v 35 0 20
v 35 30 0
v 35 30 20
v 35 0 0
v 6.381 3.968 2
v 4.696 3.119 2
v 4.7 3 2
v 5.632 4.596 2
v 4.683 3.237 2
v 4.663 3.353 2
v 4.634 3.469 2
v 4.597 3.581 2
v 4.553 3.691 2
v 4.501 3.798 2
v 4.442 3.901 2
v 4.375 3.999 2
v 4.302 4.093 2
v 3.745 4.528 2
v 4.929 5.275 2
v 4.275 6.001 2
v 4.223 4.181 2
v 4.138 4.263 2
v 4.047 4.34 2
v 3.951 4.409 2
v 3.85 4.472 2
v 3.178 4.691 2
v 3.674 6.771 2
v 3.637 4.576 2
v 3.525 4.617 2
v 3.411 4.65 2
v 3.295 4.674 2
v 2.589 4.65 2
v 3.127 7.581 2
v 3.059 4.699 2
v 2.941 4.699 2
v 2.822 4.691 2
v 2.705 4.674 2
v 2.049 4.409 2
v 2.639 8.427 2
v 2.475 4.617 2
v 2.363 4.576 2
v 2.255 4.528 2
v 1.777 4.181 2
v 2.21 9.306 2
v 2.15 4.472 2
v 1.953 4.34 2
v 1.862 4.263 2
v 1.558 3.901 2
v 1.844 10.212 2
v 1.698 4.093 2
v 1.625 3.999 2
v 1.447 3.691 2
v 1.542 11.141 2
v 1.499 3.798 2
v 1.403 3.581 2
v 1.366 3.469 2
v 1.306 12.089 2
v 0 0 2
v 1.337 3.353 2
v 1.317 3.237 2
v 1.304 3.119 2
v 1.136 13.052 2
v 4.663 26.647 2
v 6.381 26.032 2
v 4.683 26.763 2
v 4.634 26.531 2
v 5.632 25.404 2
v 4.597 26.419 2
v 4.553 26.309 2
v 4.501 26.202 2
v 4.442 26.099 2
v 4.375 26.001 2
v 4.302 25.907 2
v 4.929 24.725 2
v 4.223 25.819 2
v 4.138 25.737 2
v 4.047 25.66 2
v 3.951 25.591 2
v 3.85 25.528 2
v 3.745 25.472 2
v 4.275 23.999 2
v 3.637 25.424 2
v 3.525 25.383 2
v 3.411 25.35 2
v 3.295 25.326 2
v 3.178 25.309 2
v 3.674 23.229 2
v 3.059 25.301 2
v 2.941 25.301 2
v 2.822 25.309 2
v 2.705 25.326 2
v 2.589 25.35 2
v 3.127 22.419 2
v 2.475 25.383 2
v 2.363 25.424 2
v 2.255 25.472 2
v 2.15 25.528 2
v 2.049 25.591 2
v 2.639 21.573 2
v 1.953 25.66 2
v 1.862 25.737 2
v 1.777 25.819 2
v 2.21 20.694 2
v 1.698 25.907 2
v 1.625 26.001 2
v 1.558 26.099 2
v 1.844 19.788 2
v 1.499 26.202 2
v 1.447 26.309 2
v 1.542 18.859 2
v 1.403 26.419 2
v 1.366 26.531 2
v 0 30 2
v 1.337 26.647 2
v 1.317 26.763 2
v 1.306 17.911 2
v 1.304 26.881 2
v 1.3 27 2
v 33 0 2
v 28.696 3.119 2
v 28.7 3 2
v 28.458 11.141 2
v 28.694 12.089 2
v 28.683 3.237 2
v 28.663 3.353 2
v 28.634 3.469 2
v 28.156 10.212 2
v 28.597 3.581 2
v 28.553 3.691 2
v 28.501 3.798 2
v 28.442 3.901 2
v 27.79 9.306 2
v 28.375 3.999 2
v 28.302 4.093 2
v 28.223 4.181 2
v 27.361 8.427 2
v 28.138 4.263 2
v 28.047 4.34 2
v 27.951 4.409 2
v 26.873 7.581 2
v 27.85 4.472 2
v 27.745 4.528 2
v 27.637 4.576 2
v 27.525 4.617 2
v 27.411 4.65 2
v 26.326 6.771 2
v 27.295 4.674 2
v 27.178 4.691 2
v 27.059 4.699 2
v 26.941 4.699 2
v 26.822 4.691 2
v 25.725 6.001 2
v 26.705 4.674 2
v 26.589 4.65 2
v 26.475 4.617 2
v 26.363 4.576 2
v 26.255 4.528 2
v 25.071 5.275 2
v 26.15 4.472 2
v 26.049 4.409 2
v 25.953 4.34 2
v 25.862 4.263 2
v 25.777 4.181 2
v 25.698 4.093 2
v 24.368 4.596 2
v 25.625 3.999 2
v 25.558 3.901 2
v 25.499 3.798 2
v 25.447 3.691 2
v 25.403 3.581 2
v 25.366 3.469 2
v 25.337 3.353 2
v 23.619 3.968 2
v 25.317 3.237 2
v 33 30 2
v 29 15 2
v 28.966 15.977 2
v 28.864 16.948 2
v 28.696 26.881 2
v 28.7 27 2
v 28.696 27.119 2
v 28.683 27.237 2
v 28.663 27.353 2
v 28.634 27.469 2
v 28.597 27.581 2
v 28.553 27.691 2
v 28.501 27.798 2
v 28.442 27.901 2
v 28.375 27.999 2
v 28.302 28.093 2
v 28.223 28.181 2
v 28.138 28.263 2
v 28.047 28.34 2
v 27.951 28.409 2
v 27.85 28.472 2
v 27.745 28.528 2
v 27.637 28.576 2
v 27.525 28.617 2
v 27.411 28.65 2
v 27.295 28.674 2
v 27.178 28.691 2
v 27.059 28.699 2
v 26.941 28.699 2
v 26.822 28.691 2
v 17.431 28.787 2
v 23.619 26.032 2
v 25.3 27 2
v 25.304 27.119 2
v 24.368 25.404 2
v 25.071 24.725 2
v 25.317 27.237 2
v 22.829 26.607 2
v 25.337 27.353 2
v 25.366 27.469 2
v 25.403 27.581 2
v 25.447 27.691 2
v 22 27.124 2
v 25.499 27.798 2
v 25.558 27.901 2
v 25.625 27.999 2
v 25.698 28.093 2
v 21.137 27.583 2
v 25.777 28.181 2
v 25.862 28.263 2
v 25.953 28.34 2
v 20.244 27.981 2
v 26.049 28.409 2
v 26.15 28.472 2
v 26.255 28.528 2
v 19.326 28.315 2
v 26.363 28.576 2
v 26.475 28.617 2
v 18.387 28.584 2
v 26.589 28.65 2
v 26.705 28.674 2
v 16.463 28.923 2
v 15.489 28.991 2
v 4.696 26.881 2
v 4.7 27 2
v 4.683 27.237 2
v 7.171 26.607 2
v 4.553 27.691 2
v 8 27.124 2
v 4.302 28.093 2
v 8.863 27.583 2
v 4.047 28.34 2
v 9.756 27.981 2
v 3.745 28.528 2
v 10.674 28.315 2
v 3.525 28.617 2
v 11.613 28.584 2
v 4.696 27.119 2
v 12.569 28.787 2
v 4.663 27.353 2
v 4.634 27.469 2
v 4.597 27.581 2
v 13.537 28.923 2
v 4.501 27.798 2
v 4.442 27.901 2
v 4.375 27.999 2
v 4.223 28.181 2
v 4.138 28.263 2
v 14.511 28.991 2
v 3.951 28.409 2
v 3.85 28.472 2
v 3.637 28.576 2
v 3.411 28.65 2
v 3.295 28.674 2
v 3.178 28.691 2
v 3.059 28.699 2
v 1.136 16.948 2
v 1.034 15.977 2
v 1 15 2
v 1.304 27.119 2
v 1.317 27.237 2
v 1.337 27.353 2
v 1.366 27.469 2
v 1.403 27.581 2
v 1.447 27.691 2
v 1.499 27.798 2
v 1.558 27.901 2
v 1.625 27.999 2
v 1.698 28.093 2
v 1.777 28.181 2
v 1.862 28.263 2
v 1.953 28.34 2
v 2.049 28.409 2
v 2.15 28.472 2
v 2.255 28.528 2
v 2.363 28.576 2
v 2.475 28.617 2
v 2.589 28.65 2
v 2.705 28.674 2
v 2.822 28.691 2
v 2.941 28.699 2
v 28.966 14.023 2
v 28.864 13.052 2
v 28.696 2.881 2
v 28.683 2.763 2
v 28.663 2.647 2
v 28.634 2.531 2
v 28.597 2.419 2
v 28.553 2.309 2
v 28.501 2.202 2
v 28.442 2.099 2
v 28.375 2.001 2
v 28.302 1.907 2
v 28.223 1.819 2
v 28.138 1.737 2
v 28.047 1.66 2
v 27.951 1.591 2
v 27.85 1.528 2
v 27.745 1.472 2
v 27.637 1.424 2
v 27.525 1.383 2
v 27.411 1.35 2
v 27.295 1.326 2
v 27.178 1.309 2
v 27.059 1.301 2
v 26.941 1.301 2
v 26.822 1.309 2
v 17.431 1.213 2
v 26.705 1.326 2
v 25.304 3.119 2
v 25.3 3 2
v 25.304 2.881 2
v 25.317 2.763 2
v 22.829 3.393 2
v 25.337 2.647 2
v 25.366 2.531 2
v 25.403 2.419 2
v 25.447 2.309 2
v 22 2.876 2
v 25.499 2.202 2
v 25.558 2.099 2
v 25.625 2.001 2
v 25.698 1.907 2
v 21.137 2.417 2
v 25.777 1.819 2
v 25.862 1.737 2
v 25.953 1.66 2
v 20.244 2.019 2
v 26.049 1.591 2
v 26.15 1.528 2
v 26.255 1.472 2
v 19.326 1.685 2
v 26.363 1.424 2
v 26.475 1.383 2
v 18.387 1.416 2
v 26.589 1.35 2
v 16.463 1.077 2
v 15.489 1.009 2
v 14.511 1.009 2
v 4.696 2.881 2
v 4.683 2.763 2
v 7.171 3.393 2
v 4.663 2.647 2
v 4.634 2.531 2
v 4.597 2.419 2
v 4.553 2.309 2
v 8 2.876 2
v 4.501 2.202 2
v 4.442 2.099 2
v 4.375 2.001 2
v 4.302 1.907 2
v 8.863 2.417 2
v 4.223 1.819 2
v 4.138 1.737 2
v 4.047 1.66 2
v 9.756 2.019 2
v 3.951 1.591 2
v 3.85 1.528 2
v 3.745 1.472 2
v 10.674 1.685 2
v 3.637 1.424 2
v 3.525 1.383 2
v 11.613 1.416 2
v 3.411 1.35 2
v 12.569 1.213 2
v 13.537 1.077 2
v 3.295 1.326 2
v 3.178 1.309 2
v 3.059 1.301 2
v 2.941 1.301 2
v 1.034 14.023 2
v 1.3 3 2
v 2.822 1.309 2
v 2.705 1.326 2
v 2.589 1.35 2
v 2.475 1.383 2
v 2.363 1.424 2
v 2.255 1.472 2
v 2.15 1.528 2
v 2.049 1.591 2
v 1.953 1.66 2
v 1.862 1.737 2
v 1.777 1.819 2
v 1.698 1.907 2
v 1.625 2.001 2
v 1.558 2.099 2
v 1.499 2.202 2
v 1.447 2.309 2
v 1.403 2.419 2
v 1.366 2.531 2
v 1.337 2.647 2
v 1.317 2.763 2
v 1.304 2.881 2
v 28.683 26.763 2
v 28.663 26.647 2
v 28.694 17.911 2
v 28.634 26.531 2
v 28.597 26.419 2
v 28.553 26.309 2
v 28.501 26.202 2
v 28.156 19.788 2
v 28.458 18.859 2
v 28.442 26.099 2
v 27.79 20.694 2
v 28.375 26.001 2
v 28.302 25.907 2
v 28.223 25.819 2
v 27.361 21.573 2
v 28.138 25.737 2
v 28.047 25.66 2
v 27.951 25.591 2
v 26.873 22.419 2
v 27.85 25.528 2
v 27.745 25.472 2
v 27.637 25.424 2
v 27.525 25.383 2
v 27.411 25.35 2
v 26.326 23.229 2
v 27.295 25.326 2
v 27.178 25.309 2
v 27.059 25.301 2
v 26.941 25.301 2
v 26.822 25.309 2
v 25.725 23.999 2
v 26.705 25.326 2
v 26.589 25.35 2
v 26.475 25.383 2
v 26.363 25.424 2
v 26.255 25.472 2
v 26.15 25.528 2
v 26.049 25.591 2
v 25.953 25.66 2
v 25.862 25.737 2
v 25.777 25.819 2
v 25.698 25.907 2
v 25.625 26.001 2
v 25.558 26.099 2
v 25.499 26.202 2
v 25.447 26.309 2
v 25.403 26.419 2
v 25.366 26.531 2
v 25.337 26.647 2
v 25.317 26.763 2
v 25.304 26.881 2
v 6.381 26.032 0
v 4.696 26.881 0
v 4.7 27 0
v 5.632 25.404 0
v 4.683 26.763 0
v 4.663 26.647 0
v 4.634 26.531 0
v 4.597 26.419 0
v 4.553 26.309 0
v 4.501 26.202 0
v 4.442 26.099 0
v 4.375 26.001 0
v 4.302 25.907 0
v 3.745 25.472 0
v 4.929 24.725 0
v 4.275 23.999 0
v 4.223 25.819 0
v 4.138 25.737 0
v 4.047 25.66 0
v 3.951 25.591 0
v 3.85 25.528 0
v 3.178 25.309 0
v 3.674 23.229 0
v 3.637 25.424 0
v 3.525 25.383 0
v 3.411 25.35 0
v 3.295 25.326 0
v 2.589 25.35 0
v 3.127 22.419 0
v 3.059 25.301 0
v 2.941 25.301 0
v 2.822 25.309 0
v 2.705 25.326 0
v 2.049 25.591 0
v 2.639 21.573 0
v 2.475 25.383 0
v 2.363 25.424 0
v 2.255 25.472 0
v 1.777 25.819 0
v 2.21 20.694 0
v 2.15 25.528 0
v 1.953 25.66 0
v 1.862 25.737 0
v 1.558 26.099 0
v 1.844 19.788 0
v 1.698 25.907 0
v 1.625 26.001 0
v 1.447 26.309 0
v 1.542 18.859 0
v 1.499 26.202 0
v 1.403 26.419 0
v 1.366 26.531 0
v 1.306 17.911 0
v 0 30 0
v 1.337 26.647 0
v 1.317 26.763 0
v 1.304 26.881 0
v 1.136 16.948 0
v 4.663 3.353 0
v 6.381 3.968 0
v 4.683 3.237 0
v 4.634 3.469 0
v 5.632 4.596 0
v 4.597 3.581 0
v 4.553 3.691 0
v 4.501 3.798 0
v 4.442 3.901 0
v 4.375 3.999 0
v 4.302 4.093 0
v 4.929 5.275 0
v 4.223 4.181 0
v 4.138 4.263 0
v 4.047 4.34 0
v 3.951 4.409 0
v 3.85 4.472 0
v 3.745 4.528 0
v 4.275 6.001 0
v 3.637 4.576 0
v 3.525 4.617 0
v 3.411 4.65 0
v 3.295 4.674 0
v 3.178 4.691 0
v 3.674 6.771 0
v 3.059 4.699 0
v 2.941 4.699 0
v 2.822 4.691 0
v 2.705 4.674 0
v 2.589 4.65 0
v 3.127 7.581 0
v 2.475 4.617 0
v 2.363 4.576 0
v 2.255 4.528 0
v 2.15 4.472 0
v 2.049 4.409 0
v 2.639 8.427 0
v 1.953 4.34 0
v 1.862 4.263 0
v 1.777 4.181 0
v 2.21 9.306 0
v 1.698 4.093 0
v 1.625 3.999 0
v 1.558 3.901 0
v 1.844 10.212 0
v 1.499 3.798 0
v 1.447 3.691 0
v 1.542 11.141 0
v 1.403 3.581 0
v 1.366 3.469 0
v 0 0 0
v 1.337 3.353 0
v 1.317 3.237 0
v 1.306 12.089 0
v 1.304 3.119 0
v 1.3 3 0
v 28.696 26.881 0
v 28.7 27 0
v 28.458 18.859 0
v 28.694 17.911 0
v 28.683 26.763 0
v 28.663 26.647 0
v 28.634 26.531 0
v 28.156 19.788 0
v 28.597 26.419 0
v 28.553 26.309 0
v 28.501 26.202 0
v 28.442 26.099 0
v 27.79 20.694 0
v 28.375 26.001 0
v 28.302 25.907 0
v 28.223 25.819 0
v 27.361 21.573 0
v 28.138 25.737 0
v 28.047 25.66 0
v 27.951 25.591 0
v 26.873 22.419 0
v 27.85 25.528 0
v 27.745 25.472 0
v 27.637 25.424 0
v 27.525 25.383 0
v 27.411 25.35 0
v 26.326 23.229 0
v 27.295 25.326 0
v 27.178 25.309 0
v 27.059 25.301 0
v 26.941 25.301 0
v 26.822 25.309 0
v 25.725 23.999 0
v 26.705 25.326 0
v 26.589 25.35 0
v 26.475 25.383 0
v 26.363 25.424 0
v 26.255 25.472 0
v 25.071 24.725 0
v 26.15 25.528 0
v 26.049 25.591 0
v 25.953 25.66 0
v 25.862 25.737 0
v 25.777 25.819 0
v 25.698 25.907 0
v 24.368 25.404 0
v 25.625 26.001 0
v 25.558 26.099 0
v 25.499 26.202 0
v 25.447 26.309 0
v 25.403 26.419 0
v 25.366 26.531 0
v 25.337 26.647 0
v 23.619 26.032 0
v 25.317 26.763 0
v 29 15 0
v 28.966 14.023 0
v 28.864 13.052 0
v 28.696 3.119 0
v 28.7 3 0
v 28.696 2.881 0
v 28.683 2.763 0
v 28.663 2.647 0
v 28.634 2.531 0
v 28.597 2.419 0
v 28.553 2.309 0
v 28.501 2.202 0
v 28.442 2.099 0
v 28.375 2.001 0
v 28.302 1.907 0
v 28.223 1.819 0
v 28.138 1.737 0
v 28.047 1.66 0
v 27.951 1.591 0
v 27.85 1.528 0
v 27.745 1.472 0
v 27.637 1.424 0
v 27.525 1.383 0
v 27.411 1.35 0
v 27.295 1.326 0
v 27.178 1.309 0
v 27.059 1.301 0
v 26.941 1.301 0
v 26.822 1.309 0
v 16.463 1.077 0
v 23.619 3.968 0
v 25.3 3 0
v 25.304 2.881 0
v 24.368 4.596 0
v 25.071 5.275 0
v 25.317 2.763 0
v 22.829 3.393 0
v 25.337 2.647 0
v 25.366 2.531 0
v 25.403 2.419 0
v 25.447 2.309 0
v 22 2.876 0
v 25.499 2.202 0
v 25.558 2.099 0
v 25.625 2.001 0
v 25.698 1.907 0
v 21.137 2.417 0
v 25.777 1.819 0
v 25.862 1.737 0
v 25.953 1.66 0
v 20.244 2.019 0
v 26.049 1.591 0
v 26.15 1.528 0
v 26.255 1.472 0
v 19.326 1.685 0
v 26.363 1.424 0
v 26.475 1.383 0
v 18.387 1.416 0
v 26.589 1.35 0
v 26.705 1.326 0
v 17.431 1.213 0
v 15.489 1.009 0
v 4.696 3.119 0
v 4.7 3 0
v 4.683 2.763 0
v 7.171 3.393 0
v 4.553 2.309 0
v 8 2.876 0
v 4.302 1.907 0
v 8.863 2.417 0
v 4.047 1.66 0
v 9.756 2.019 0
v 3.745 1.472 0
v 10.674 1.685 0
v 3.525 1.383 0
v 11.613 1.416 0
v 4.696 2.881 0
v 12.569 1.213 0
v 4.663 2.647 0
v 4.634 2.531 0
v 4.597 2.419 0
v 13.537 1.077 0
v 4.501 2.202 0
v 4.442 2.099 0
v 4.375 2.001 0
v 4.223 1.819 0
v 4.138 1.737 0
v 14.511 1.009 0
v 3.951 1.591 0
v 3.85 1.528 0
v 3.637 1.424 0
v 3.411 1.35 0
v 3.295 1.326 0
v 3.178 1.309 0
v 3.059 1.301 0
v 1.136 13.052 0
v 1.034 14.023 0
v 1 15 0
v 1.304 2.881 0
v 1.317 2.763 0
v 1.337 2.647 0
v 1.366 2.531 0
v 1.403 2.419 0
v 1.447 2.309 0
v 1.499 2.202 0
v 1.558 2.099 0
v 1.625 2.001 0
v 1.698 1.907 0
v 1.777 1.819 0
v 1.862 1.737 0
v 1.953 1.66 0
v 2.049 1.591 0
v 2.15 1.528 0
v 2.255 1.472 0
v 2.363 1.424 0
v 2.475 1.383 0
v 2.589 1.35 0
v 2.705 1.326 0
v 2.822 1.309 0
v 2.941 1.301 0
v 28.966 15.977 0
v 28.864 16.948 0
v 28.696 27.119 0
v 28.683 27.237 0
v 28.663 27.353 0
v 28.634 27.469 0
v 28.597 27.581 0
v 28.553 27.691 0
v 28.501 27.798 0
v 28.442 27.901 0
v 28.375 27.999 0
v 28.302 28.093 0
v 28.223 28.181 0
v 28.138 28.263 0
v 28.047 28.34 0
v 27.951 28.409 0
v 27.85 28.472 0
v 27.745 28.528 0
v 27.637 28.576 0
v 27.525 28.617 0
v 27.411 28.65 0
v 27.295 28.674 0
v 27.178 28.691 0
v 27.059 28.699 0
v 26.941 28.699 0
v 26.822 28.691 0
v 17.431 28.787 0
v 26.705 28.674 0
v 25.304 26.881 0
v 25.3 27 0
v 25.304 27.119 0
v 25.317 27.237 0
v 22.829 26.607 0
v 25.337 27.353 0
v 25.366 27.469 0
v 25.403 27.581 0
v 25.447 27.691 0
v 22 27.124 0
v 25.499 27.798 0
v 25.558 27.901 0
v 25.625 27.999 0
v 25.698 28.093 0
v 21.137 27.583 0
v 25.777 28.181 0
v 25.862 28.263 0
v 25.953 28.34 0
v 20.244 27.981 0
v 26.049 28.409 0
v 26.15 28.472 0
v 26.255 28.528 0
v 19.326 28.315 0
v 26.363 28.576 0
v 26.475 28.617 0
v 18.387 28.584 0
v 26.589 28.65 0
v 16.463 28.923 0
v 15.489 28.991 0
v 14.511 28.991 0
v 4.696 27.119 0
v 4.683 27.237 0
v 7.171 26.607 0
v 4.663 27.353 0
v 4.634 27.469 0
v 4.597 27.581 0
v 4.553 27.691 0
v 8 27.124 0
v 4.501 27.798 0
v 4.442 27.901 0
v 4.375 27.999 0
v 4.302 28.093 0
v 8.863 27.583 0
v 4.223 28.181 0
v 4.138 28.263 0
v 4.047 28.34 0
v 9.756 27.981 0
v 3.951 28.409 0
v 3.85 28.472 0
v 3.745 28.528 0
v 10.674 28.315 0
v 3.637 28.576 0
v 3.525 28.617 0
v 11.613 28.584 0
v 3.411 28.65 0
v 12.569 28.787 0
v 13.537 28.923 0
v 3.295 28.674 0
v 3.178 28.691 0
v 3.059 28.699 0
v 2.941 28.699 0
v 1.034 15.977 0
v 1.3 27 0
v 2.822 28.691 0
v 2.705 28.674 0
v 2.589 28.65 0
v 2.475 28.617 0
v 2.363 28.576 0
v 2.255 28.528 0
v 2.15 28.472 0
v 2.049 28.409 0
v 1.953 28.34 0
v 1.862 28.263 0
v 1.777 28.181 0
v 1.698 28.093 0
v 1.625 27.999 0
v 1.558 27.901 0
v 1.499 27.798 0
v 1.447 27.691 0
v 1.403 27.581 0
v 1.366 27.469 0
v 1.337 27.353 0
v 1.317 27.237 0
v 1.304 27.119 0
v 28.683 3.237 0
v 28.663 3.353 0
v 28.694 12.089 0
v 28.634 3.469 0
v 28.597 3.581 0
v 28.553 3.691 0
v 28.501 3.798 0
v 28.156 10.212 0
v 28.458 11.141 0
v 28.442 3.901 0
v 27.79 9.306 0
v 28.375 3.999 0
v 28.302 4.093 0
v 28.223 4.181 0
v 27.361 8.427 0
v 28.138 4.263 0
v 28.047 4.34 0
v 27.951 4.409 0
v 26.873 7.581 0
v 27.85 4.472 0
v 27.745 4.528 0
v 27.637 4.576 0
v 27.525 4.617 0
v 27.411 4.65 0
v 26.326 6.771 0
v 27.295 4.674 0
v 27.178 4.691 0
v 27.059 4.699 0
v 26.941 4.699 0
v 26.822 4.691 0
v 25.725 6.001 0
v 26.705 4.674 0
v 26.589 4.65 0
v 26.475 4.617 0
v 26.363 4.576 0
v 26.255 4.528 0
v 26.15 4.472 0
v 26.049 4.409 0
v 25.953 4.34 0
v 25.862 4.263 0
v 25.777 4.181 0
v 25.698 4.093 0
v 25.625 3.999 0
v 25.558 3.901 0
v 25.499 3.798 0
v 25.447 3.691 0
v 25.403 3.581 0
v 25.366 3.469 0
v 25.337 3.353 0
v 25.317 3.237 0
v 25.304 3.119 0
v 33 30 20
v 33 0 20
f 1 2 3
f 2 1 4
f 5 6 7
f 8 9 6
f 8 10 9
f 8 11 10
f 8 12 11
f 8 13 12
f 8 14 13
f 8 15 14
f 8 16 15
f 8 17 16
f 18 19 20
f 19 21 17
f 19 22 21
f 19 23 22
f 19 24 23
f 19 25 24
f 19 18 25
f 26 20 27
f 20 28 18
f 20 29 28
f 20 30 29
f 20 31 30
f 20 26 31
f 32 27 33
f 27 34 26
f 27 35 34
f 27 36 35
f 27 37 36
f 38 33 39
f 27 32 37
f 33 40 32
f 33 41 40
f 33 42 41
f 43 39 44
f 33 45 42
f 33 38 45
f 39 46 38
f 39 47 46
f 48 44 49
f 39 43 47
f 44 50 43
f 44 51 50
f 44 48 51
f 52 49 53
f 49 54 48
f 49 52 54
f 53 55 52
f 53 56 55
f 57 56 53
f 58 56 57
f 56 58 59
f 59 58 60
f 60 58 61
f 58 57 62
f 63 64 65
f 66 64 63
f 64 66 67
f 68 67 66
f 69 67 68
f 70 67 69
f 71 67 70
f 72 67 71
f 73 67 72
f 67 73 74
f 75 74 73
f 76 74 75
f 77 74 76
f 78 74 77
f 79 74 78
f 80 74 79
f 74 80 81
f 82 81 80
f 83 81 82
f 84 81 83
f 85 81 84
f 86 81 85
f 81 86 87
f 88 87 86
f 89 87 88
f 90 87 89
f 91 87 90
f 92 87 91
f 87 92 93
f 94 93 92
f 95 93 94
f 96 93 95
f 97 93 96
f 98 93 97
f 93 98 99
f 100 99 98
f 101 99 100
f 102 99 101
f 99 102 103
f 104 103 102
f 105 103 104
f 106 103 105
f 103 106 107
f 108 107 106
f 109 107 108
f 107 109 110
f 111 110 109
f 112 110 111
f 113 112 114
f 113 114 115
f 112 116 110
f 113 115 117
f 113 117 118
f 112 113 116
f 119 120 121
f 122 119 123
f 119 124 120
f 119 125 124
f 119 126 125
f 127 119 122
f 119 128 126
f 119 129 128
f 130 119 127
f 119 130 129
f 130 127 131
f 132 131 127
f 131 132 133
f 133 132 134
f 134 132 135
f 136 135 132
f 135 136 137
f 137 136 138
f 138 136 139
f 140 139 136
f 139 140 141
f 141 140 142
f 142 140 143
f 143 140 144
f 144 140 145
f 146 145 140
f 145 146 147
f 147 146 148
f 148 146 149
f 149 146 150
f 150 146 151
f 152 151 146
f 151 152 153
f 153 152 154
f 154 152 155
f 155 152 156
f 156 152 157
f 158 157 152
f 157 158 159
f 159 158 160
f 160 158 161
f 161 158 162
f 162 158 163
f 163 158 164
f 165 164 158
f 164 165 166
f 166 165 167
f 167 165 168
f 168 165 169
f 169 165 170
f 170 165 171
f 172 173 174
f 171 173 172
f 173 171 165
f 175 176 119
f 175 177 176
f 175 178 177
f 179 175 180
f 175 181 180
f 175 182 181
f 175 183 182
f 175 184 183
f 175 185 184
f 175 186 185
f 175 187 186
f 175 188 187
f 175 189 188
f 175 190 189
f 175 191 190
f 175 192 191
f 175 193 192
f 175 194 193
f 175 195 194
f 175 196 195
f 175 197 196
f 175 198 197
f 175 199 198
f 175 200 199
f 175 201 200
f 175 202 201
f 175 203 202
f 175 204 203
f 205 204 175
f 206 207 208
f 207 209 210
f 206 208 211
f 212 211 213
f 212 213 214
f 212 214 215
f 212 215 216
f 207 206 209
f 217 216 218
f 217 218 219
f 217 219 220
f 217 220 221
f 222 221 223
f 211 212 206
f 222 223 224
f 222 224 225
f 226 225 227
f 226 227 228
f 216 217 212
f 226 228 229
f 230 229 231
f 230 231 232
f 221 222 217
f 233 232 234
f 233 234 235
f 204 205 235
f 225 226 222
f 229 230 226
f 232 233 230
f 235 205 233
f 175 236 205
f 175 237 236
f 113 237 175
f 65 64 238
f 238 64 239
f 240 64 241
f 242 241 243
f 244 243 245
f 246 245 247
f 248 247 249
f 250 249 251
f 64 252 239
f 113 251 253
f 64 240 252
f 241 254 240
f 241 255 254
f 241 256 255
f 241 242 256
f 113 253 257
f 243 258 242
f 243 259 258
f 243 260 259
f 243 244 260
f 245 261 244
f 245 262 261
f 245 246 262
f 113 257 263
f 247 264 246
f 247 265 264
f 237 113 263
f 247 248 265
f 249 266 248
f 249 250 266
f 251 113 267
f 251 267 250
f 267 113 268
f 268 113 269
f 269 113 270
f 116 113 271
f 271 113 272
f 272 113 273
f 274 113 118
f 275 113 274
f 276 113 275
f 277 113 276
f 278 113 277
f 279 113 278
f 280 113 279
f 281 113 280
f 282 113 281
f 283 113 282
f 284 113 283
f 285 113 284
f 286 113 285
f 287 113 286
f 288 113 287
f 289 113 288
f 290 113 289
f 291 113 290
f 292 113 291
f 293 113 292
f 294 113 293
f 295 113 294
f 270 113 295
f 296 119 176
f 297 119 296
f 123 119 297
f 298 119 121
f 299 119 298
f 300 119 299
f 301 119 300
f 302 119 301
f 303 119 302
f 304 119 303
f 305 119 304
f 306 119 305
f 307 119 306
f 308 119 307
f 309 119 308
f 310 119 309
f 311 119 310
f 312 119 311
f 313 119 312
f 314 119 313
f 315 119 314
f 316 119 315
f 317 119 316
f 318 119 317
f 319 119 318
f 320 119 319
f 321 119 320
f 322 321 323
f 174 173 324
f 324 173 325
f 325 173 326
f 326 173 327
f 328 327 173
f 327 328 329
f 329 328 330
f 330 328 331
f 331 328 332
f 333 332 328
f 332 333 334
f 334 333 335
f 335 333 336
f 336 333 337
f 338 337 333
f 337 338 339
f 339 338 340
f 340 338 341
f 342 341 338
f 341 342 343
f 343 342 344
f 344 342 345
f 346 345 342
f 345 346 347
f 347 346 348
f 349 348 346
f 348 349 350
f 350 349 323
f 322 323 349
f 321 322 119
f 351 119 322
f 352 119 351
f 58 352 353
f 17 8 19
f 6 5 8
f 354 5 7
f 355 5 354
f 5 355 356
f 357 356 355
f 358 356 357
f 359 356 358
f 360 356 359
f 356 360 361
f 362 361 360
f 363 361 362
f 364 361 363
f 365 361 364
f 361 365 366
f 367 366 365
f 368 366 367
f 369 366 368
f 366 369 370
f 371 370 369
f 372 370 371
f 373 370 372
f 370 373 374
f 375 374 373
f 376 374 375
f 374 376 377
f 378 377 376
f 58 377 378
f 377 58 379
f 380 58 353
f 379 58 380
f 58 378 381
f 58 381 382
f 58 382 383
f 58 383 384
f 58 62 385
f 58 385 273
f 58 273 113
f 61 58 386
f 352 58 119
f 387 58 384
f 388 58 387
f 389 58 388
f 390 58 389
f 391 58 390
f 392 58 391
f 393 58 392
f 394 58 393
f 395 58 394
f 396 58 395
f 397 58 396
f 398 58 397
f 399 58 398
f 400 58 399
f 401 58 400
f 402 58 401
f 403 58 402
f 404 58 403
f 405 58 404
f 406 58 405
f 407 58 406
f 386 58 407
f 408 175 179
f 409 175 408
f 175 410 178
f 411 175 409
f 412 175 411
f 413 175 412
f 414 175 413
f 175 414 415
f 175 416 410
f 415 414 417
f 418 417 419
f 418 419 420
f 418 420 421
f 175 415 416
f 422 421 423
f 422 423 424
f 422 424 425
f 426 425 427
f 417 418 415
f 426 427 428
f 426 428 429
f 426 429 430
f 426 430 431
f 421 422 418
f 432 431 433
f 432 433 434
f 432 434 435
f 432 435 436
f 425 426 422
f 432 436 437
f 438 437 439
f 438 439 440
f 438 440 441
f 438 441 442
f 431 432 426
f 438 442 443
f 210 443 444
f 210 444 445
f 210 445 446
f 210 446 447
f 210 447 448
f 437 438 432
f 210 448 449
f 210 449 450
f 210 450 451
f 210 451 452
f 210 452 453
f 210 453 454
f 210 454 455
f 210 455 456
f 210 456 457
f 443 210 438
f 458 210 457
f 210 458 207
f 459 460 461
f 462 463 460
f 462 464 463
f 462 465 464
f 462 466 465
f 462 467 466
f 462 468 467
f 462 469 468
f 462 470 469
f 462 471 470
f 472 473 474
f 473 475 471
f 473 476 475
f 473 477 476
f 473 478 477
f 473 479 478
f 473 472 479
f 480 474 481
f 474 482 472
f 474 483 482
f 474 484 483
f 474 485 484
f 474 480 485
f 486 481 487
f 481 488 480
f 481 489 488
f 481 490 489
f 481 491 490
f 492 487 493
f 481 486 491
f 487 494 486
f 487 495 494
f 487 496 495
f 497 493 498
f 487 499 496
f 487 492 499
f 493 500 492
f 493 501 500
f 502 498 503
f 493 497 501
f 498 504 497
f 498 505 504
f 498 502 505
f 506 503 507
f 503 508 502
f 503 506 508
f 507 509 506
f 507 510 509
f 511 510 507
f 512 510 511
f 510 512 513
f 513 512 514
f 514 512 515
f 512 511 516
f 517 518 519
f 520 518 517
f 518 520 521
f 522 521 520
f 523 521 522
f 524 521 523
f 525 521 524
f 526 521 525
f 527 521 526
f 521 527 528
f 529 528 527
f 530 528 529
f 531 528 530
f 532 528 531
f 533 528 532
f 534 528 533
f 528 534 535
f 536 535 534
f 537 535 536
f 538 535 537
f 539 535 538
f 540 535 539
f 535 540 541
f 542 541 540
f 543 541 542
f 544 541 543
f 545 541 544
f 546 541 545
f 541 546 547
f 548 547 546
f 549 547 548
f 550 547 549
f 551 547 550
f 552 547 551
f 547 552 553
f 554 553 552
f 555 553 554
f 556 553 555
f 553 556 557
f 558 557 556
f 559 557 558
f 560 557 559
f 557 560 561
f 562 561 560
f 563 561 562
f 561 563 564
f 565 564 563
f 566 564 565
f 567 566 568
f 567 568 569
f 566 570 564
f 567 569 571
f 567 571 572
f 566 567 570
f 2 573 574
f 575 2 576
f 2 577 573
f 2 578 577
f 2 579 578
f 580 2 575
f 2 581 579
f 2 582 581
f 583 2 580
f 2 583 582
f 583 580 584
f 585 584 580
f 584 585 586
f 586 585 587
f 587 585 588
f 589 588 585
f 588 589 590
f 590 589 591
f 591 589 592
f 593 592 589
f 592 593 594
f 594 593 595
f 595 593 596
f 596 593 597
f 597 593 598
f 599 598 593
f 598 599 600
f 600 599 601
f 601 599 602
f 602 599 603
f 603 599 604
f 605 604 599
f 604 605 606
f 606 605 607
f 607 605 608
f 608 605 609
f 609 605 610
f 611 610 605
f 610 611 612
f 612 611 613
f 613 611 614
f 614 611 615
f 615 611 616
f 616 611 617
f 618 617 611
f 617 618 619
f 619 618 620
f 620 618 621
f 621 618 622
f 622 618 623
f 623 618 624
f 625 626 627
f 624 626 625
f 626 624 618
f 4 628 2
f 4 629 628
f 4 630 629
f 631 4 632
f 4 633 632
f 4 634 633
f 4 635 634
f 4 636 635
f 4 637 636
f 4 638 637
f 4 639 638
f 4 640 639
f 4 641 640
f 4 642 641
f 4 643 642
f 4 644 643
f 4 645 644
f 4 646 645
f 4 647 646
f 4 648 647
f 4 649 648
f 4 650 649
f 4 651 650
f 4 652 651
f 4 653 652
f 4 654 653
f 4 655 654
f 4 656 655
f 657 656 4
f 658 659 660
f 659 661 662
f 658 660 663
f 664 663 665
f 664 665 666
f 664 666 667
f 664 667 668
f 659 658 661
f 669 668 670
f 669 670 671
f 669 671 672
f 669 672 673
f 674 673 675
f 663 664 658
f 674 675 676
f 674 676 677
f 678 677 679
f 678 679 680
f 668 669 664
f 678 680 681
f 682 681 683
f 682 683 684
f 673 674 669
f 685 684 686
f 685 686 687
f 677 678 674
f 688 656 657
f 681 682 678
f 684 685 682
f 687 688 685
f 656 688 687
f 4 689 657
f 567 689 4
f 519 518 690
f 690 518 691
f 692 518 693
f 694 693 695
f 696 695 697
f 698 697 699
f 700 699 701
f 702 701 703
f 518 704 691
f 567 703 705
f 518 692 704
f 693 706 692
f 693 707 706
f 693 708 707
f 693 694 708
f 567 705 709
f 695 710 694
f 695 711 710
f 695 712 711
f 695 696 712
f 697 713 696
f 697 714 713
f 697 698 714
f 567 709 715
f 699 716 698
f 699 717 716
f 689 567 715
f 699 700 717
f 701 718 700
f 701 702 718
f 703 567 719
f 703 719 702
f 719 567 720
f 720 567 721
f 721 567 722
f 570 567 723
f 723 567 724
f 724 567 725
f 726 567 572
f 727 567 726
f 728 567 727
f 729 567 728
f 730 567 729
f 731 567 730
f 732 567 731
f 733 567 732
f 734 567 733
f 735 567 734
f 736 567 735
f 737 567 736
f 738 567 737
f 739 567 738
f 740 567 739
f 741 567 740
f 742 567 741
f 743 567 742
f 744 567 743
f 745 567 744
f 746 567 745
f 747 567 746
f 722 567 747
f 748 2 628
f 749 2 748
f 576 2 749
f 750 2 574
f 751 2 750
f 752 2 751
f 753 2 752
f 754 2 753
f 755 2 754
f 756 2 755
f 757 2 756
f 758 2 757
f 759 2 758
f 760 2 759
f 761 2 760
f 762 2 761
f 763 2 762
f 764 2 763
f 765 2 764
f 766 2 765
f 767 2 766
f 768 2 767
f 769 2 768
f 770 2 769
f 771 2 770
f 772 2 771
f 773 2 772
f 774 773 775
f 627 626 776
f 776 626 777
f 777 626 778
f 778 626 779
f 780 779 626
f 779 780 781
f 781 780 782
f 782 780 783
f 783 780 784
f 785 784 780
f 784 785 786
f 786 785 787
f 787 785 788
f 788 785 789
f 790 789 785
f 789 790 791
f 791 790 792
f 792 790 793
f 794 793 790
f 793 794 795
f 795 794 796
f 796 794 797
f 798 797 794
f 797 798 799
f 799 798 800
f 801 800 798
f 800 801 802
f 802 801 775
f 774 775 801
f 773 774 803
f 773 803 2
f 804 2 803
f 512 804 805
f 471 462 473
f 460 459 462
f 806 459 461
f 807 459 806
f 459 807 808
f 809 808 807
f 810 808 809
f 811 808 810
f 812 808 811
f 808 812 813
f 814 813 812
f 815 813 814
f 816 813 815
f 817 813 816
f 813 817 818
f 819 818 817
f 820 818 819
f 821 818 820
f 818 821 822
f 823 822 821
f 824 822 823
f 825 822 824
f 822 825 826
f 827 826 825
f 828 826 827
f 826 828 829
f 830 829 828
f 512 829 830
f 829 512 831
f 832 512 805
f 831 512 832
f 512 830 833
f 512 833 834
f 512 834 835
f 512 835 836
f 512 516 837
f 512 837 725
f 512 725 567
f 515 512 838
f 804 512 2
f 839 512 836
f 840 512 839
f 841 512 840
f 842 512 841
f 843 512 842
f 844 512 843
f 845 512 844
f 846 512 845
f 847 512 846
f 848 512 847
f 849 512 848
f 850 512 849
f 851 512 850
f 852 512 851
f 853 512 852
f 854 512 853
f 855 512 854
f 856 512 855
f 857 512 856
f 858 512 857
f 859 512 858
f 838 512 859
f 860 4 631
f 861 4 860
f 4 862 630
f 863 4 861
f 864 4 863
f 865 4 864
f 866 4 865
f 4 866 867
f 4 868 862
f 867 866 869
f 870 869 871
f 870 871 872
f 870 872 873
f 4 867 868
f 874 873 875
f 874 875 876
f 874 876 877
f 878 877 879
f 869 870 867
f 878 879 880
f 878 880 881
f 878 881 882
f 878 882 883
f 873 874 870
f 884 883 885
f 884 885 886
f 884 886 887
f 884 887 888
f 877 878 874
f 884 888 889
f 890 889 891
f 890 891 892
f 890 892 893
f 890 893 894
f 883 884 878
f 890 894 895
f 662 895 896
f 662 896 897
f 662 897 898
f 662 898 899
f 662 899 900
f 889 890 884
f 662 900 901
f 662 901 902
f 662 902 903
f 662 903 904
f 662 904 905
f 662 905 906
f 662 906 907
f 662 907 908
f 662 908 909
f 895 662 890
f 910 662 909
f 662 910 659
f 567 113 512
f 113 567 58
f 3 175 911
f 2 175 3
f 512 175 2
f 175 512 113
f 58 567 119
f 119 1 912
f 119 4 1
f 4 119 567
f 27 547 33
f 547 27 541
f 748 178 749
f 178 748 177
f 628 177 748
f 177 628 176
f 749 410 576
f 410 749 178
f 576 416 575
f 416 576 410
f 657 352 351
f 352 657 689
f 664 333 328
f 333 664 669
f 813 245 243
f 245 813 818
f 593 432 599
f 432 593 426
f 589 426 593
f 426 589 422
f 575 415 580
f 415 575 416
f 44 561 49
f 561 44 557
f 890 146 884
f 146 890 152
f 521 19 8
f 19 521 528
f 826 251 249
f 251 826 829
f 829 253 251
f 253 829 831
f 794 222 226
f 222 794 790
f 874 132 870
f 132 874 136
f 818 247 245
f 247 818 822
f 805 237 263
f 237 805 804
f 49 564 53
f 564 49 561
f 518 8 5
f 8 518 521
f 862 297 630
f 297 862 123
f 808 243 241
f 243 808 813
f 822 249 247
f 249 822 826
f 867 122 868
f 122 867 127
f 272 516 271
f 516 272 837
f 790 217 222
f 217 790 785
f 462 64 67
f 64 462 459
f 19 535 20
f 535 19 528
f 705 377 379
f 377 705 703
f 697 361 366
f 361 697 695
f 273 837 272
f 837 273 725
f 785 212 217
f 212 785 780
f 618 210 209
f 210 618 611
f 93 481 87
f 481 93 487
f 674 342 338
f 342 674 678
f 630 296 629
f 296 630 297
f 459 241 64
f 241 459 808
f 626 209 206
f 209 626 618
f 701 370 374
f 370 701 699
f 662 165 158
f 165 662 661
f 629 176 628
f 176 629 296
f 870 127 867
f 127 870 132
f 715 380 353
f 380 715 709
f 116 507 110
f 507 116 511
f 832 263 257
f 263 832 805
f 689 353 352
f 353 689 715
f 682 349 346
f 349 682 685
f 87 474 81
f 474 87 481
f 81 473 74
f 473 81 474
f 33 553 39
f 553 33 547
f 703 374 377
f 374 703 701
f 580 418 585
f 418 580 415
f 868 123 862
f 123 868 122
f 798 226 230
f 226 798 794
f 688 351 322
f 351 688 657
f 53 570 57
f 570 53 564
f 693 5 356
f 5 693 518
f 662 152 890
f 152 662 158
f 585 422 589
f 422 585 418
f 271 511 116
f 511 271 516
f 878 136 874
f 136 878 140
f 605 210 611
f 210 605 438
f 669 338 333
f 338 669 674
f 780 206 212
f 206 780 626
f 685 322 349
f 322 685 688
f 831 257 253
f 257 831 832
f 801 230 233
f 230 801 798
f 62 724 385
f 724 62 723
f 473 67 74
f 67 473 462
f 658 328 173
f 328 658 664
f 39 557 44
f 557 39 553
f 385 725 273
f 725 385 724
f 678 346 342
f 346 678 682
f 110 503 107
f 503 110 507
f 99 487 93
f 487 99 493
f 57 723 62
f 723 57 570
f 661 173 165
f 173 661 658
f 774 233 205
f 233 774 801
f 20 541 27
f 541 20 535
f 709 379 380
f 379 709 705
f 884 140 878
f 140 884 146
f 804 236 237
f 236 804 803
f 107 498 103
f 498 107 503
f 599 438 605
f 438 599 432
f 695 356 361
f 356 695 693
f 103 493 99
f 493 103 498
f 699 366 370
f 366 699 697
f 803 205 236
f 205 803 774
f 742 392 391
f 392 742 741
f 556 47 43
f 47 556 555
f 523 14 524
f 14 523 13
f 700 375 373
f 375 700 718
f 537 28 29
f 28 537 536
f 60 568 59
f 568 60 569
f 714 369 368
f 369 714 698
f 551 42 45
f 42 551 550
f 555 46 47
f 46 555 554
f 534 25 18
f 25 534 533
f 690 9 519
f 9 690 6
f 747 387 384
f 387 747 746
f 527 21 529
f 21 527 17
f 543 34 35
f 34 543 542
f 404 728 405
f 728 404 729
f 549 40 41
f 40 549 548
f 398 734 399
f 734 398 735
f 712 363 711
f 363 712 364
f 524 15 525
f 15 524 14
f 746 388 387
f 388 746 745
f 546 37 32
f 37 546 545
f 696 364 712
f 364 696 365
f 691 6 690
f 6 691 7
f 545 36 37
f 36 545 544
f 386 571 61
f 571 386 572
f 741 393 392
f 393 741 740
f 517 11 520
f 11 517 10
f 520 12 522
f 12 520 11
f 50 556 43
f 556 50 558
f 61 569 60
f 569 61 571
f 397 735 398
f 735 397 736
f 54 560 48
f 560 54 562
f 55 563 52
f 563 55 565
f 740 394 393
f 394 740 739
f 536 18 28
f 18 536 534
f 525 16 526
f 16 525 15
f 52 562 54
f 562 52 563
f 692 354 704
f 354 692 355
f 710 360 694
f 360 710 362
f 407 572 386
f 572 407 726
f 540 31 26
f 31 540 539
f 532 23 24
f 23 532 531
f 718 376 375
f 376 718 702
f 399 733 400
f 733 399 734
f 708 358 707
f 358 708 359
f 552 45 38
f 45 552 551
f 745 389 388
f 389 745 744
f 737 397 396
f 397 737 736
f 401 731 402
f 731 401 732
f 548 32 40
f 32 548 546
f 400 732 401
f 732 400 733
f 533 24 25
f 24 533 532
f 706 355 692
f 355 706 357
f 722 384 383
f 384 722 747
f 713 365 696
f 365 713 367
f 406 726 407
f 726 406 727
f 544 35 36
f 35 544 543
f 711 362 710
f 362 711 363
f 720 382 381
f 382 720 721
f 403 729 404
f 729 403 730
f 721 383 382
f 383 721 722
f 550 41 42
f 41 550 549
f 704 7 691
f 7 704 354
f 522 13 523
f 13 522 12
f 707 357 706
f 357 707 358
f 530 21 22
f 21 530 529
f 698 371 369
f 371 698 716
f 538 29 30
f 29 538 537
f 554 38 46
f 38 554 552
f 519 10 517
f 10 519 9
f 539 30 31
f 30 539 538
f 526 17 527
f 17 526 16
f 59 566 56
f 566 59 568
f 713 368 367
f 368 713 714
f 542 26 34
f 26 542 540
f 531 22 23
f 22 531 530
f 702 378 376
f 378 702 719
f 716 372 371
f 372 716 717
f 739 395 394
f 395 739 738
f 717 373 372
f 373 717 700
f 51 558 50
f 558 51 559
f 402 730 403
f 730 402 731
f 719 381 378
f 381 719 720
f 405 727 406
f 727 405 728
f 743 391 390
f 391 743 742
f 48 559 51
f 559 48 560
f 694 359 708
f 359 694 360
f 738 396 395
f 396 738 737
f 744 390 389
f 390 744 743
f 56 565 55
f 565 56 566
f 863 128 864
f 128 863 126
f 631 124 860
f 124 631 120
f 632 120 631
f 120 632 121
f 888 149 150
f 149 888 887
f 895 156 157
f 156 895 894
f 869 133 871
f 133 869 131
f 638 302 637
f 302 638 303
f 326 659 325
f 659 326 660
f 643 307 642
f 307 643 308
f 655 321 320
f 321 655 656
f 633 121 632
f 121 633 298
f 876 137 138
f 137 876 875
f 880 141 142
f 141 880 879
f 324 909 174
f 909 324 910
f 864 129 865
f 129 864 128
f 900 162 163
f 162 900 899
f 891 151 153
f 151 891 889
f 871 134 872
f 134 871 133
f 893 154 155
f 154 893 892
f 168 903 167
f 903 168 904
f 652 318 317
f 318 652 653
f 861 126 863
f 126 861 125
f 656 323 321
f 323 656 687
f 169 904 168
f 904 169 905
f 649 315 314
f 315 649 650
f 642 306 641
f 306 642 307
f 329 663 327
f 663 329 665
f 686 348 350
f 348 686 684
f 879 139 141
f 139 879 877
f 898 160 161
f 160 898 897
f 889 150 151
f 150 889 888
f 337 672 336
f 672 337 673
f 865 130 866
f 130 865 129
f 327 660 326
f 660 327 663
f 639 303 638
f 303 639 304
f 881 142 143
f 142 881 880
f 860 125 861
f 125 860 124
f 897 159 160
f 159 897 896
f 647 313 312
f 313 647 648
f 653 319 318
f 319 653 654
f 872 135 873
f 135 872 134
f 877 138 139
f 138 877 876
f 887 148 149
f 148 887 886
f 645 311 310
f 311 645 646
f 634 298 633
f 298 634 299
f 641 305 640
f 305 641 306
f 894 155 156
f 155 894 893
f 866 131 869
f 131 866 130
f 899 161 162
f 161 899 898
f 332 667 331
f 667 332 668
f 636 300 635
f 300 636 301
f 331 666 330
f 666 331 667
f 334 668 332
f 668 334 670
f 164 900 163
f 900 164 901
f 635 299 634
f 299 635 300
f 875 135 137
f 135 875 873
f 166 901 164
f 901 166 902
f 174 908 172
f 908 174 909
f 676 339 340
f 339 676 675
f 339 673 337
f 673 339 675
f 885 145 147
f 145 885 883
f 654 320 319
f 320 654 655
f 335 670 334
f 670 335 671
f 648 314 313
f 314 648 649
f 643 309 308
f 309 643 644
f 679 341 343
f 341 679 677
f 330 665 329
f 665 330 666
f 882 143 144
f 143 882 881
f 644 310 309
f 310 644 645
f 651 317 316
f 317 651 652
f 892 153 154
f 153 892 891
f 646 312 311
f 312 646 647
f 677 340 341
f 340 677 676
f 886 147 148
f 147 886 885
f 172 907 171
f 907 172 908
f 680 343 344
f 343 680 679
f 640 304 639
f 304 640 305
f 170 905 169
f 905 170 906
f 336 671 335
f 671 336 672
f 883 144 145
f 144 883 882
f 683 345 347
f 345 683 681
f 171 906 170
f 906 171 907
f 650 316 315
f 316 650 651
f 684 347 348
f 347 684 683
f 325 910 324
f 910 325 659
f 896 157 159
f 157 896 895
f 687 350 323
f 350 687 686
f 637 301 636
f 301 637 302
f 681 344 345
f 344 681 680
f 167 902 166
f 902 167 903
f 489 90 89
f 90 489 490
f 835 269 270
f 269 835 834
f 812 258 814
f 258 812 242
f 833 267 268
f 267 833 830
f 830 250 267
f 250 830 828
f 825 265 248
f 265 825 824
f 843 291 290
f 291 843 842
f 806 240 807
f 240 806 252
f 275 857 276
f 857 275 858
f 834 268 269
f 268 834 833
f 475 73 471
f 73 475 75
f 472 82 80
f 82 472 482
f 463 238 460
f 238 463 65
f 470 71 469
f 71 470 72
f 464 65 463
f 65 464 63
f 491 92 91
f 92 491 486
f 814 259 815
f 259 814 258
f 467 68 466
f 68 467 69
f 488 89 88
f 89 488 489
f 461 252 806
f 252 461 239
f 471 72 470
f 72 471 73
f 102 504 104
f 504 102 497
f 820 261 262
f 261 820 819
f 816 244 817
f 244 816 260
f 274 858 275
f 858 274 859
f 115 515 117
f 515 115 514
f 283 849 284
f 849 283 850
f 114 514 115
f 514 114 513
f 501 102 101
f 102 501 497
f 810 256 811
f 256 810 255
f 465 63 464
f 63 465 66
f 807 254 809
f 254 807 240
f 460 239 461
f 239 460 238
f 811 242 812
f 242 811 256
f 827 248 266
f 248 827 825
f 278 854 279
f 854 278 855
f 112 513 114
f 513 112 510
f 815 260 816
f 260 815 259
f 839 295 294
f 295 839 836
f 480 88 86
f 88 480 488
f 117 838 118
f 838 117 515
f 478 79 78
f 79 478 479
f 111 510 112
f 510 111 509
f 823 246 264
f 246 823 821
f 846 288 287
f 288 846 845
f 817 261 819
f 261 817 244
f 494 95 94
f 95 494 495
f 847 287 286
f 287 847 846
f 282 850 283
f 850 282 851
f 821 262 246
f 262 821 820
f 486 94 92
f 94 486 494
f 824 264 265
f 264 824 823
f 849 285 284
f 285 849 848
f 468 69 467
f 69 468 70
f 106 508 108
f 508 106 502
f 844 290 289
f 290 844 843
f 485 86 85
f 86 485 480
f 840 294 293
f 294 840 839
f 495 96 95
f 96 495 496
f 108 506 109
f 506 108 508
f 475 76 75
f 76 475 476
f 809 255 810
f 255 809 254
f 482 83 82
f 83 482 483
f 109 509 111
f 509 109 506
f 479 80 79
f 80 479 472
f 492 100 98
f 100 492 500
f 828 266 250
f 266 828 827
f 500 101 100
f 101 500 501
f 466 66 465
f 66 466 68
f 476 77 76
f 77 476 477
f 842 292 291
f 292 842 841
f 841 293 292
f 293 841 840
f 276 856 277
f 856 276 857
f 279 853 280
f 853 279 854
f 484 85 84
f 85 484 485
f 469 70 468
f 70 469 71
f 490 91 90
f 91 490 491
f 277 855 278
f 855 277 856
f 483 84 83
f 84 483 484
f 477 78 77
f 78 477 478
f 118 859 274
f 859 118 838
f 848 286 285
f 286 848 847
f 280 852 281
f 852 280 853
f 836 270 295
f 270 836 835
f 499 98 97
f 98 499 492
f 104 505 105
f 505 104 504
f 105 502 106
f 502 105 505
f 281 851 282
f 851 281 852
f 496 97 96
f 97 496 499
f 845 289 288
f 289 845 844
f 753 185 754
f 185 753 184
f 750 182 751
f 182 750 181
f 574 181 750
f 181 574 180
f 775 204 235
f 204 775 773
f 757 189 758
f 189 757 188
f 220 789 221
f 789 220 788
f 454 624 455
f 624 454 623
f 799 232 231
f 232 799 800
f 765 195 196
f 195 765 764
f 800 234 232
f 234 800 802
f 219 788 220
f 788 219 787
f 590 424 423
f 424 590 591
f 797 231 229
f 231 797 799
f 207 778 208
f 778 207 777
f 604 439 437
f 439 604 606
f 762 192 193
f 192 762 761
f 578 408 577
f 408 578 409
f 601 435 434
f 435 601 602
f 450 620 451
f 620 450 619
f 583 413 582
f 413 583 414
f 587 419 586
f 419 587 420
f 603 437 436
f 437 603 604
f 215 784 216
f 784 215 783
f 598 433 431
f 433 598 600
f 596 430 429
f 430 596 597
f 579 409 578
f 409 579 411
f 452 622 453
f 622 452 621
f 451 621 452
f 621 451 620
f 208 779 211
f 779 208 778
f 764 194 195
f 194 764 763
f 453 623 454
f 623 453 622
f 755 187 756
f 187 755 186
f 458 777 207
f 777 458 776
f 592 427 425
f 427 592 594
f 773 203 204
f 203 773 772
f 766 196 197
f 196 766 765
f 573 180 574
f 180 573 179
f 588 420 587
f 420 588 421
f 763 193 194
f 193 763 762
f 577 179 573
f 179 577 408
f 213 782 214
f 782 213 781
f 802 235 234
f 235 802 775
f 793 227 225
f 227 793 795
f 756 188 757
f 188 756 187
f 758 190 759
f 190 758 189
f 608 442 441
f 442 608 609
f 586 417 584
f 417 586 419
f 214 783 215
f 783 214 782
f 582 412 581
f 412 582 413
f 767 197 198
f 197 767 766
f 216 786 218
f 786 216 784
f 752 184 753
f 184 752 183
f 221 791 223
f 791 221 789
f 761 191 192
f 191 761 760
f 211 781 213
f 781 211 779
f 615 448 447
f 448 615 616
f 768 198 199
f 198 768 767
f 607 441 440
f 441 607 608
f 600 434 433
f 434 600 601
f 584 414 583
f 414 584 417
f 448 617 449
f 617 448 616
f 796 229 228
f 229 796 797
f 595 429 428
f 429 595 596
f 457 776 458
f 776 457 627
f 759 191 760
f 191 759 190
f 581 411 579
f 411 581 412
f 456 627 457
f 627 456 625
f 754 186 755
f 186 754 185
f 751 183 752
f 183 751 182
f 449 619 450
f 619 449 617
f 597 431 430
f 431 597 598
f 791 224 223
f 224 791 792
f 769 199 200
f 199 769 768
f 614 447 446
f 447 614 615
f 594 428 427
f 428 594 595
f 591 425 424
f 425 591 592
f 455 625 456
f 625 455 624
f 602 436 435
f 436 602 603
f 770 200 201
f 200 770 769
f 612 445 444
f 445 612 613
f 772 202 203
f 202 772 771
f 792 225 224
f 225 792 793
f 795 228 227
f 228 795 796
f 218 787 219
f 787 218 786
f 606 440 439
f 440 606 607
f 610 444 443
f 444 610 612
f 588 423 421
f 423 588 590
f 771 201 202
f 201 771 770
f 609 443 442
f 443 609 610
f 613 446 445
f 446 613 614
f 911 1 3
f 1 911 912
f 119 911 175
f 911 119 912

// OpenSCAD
$fn=90;

t=2;

fs=30;
fd=28;
hd=3.4;
rd=3;

sx=5;
sz=20;

difference() {
    cube([fs+sx, fs, t]);
    translate([fs/2, fs/2, 0]) cylinder(t, d=fd);
    translate([rd, rd, 0]) cylinder(t, d=hd);
    translate([fs-rd, rd, 0]) cylinder(t, d=hd);
    translate([rd, fs-rd, 0]) cylinder(t, d=hd);
    translate([fs-rd, fs-rd, 0]) cylinder(t, d=hd);
}

translate([fs+sx-t, 0, 0]) cube([2, fs, sz]);
